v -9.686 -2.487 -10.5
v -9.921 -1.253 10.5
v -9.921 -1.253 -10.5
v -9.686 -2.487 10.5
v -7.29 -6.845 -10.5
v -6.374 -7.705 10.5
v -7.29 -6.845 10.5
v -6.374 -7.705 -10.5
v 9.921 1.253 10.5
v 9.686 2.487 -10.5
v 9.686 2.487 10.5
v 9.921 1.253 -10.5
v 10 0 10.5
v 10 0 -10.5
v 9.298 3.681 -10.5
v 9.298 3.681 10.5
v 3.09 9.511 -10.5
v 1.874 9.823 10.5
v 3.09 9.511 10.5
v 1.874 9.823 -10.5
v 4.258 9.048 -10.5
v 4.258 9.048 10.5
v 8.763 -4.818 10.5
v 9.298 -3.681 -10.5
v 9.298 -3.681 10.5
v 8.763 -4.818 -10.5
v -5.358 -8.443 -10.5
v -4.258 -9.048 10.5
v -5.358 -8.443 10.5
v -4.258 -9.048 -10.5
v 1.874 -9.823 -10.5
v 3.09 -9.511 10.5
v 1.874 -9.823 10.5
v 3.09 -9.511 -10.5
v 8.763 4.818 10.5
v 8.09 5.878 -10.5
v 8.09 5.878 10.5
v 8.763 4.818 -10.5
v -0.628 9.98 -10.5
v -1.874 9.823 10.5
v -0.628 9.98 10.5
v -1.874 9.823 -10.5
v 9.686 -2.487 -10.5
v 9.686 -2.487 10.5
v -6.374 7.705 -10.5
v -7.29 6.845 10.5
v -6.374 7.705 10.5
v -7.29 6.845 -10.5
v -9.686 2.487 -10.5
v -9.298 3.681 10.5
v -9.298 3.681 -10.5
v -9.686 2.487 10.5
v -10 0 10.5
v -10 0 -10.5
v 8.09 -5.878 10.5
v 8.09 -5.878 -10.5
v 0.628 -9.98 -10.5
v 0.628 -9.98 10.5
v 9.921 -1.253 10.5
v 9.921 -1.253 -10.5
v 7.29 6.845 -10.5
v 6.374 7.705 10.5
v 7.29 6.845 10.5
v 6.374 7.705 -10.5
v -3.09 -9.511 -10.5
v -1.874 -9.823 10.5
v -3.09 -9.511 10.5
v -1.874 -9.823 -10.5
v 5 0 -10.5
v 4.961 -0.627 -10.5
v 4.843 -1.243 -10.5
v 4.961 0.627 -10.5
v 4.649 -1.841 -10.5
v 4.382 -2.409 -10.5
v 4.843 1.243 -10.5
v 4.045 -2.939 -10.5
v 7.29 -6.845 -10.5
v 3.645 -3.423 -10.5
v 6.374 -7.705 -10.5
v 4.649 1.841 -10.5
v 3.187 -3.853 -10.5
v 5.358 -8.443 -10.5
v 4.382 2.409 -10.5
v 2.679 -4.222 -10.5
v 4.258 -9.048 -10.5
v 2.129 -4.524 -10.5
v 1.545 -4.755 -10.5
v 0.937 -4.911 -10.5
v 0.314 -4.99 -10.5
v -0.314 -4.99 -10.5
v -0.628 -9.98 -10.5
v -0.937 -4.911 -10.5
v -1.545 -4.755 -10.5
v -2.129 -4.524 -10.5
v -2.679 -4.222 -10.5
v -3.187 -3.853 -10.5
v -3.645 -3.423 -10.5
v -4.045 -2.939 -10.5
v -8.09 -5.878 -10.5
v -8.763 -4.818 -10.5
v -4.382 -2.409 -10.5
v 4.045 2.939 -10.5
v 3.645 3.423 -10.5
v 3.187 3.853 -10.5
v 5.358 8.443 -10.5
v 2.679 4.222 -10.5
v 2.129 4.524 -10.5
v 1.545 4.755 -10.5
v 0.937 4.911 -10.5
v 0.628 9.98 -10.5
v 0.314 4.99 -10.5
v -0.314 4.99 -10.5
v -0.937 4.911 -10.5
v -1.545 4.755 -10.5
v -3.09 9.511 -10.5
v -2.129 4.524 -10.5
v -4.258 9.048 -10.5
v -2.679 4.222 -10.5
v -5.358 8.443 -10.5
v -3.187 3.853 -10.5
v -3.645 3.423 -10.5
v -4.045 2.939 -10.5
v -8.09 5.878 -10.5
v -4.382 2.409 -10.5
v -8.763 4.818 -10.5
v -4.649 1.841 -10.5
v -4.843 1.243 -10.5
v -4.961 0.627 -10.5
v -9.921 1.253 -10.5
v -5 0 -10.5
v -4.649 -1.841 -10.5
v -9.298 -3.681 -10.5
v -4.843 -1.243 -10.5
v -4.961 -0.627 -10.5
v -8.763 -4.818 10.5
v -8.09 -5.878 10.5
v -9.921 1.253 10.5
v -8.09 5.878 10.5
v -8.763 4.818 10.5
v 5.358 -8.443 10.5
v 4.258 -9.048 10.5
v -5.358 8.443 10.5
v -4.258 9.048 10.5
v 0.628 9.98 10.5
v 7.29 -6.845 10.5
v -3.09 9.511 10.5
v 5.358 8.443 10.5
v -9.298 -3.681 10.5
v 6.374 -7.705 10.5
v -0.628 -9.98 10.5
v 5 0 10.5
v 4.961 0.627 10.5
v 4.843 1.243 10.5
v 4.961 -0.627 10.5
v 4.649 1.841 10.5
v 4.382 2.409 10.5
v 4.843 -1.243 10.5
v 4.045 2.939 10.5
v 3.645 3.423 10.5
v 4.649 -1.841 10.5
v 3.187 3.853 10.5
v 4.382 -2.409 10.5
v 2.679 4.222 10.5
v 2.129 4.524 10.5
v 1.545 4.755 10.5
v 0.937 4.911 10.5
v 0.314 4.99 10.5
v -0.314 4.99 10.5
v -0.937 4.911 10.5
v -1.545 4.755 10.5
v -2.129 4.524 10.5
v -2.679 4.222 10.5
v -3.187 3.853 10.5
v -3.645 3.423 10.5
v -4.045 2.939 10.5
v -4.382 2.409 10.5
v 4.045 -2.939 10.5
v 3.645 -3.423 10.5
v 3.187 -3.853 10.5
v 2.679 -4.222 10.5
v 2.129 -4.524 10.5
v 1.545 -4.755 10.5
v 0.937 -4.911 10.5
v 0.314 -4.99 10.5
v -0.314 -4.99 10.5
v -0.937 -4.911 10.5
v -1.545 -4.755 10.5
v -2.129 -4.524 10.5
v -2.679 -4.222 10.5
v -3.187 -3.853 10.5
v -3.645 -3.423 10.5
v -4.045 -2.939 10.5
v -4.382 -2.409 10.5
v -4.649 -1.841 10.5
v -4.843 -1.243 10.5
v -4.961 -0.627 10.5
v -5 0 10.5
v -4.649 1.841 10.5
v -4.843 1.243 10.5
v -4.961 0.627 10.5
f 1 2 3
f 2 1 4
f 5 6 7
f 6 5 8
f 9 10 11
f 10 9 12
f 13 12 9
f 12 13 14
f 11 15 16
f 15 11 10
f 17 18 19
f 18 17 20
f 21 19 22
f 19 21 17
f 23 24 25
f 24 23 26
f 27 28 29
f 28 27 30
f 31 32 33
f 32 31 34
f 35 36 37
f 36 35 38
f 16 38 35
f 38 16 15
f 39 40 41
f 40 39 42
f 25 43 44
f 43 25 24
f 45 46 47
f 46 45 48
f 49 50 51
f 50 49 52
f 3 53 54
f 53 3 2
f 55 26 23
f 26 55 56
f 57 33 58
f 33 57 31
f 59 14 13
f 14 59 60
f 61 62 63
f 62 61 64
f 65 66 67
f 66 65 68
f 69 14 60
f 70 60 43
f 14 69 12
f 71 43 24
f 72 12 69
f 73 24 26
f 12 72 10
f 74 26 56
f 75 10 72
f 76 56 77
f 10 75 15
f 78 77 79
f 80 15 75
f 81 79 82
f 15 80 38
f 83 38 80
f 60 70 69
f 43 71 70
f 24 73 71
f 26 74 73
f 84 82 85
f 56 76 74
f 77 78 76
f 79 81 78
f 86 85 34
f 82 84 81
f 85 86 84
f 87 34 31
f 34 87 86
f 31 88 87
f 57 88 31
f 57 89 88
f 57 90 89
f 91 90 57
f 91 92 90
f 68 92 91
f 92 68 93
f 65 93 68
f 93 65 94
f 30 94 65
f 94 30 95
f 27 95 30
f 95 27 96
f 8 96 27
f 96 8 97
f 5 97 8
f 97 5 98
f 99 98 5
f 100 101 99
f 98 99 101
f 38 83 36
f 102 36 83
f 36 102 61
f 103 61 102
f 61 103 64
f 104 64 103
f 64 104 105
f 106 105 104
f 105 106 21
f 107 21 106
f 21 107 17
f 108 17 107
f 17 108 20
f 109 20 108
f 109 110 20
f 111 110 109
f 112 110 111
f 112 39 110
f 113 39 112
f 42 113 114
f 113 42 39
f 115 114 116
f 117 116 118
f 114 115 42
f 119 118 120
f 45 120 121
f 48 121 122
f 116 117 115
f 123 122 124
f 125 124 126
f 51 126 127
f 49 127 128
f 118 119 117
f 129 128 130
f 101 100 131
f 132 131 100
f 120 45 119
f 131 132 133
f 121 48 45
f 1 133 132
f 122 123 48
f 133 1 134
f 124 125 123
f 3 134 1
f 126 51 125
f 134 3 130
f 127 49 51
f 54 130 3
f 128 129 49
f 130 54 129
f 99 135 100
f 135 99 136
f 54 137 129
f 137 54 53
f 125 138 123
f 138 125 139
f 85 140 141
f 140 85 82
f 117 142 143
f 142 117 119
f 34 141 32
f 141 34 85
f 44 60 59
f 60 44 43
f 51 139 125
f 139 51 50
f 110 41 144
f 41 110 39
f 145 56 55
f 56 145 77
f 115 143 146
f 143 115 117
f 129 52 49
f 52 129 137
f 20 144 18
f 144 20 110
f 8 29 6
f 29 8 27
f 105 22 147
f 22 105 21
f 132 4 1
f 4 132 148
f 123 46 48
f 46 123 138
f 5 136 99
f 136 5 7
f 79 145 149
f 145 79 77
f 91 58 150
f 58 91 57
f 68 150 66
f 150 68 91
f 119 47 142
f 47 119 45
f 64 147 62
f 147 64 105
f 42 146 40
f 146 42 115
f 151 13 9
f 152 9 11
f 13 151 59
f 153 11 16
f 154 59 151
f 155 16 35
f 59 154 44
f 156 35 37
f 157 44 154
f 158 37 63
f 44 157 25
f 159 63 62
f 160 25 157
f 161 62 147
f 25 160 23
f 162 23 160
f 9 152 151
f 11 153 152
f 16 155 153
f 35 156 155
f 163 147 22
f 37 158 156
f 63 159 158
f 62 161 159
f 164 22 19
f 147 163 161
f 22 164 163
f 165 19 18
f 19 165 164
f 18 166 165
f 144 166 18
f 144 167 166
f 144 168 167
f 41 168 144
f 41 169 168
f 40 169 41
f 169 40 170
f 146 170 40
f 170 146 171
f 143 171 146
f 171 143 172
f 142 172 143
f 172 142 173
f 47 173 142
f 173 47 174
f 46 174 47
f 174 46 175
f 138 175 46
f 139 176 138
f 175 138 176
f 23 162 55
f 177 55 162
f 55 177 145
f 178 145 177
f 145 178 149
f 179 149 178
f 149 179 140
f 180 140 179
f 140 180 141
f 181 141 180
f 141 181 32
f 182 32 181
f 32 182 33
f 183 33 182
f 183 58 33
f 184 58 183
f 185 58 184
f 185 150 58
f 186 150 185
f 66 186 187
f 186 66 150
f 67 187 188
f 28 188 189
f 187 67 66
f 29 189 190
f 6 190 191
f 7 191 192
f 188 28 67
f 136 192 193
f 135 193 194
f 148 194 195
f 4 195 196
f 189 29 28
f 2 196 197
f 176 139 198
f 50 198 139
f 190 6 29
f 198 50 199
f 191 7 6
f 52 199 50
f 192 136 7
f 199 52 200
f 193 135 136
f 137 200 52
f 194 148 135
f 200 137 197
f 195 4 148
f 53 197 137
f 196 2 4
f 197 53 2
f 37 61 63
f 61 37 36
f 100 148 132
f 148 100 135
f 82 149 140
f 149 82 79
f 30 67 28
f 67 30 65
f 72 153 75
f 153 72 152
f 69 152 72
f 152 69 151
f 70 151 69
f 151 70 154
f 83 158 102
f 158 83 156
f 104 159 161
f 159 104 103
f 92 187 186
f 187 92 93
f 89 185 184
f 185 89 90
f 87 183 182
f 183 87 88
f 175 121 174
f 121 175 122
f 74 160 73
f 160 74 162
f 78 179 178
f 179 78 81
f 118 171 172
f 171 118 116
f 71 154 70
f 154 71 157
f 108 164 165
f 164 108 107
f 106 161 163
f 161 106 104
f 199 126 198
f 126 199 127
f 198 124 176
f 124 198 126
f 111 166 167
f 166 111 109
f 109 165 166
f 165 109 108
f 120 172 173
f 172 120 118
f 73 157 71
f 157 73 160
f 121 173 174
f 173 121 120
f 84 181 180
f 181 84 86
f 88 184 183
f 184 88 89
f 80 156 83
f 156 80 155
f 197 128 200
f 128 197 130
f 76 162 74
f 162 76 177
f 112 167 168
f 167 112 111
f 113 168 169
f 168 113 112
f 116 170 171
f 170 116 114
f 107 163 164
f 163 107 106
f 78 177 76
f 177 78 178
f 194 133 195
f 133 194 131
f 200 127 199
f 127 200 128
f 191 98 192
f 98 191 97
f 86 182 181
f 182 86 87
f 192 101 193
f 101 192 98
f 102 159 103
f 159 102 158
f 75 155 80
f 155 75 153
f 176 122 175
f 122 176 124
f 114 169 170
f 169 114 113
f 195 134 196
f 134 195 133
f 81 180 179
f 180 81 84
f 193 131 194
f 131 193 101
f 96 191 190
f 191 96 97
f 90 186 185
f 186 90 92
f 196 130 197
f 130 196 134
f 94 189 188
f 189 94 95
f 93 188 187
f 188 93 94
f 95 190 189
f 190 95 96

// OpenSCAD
$fn = 50;


difference() {
	union() {
		translate(v = [0, 0, -10.5000000000]) {
			cylinder(h = 21, r = 10.0000000000);
		}
	}
	union() {
		translate(v = [0, 0, -100.0000000000]) {
			cylinder(h = 200, r = 5.0000000000);
		}
	}
}
